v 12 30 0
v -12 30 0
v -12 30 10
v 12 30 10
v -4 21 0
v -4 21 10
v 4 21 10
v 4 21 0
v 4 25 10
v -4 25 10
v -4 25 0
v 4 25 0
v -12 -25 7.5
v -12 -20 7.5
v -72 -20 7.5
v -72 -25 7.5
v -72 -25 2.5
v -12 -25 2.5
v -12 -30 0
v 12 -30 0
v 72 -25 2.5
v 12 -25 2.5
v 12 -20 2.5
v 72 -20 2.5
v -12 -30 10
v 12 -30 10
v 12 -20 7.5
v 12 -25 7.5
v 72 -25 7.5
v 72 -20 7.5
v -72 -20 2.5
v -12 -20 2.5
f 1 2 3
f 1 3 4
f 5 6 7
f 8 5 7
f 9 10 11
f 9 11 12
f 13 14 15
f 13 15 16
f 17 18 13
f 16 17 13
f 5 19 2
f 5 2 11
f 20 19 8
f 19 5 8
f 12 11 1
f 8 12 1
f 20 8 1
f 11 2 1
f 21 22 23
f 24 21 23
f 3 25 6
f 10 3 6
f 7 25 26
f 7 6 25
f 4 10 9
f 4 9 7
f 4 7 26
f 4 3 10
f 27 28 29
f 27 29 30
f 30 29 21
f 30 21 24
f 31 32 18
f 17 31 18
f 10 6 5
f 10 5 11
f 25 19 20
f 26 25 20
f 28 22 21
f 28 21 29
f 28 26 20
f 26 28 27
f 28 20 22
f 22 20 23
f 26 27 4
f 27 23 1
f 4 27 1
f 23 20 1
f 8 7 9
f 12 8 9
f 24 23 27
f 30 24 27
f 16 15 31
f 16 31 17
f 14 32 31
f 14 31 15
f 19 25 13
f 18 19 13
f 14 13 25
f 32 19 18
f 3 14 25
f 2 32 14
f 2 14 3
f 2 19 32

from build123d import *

# Parameters (mm, degrees)
F0_W     = 24
F0_H     = 60
F1_DEPTH = 10
F2_W     = 8
F2_H     = 4
F3_DEPTH = 25
F4_W     = 5
F4_H     = 5
F5_DEPTH = 60
F6_W     = 5
F6_H     = 5
F7_DEPTH = 60


with BuildPart() as f1:
    # F0 (on Top) → F1 (new body)
    with BuildSketch(Plane.XY):
        Rectangle(F0_W, F0_H)
    extrude(amount=F1_DEPTH)

    # F2 (on face) → F3 (cut)
    with BuildSketch(Plane.XY.offset(10)):
        with Locations((0, 23)):
            Rectangle(F2_W, F2_H)
    extrude(amount=-F3_DEPTH, mode=Mode.SUBTRACT)

    # F4 (on face) → F5 (join)
    with BuildSketch(Plane.YZ.offset(12)):
        with Locations((-22.5, 5)):
            Rectangle(F4_W, F4_H)
    extrude(amount=F5_DEPTH)

    # F6 (on face) → F7 (join)
    with BuildSketch(Plane(origin=(-12, 0, 0), x_dir=(0, -1, 0), z_dir=(-1, 0, 0))):
        with Locations((22.5, 5)):
            Rectangle(F6_W, F6_H)
    extrude(amount=F7_DEPTH)


solid = f1.part
